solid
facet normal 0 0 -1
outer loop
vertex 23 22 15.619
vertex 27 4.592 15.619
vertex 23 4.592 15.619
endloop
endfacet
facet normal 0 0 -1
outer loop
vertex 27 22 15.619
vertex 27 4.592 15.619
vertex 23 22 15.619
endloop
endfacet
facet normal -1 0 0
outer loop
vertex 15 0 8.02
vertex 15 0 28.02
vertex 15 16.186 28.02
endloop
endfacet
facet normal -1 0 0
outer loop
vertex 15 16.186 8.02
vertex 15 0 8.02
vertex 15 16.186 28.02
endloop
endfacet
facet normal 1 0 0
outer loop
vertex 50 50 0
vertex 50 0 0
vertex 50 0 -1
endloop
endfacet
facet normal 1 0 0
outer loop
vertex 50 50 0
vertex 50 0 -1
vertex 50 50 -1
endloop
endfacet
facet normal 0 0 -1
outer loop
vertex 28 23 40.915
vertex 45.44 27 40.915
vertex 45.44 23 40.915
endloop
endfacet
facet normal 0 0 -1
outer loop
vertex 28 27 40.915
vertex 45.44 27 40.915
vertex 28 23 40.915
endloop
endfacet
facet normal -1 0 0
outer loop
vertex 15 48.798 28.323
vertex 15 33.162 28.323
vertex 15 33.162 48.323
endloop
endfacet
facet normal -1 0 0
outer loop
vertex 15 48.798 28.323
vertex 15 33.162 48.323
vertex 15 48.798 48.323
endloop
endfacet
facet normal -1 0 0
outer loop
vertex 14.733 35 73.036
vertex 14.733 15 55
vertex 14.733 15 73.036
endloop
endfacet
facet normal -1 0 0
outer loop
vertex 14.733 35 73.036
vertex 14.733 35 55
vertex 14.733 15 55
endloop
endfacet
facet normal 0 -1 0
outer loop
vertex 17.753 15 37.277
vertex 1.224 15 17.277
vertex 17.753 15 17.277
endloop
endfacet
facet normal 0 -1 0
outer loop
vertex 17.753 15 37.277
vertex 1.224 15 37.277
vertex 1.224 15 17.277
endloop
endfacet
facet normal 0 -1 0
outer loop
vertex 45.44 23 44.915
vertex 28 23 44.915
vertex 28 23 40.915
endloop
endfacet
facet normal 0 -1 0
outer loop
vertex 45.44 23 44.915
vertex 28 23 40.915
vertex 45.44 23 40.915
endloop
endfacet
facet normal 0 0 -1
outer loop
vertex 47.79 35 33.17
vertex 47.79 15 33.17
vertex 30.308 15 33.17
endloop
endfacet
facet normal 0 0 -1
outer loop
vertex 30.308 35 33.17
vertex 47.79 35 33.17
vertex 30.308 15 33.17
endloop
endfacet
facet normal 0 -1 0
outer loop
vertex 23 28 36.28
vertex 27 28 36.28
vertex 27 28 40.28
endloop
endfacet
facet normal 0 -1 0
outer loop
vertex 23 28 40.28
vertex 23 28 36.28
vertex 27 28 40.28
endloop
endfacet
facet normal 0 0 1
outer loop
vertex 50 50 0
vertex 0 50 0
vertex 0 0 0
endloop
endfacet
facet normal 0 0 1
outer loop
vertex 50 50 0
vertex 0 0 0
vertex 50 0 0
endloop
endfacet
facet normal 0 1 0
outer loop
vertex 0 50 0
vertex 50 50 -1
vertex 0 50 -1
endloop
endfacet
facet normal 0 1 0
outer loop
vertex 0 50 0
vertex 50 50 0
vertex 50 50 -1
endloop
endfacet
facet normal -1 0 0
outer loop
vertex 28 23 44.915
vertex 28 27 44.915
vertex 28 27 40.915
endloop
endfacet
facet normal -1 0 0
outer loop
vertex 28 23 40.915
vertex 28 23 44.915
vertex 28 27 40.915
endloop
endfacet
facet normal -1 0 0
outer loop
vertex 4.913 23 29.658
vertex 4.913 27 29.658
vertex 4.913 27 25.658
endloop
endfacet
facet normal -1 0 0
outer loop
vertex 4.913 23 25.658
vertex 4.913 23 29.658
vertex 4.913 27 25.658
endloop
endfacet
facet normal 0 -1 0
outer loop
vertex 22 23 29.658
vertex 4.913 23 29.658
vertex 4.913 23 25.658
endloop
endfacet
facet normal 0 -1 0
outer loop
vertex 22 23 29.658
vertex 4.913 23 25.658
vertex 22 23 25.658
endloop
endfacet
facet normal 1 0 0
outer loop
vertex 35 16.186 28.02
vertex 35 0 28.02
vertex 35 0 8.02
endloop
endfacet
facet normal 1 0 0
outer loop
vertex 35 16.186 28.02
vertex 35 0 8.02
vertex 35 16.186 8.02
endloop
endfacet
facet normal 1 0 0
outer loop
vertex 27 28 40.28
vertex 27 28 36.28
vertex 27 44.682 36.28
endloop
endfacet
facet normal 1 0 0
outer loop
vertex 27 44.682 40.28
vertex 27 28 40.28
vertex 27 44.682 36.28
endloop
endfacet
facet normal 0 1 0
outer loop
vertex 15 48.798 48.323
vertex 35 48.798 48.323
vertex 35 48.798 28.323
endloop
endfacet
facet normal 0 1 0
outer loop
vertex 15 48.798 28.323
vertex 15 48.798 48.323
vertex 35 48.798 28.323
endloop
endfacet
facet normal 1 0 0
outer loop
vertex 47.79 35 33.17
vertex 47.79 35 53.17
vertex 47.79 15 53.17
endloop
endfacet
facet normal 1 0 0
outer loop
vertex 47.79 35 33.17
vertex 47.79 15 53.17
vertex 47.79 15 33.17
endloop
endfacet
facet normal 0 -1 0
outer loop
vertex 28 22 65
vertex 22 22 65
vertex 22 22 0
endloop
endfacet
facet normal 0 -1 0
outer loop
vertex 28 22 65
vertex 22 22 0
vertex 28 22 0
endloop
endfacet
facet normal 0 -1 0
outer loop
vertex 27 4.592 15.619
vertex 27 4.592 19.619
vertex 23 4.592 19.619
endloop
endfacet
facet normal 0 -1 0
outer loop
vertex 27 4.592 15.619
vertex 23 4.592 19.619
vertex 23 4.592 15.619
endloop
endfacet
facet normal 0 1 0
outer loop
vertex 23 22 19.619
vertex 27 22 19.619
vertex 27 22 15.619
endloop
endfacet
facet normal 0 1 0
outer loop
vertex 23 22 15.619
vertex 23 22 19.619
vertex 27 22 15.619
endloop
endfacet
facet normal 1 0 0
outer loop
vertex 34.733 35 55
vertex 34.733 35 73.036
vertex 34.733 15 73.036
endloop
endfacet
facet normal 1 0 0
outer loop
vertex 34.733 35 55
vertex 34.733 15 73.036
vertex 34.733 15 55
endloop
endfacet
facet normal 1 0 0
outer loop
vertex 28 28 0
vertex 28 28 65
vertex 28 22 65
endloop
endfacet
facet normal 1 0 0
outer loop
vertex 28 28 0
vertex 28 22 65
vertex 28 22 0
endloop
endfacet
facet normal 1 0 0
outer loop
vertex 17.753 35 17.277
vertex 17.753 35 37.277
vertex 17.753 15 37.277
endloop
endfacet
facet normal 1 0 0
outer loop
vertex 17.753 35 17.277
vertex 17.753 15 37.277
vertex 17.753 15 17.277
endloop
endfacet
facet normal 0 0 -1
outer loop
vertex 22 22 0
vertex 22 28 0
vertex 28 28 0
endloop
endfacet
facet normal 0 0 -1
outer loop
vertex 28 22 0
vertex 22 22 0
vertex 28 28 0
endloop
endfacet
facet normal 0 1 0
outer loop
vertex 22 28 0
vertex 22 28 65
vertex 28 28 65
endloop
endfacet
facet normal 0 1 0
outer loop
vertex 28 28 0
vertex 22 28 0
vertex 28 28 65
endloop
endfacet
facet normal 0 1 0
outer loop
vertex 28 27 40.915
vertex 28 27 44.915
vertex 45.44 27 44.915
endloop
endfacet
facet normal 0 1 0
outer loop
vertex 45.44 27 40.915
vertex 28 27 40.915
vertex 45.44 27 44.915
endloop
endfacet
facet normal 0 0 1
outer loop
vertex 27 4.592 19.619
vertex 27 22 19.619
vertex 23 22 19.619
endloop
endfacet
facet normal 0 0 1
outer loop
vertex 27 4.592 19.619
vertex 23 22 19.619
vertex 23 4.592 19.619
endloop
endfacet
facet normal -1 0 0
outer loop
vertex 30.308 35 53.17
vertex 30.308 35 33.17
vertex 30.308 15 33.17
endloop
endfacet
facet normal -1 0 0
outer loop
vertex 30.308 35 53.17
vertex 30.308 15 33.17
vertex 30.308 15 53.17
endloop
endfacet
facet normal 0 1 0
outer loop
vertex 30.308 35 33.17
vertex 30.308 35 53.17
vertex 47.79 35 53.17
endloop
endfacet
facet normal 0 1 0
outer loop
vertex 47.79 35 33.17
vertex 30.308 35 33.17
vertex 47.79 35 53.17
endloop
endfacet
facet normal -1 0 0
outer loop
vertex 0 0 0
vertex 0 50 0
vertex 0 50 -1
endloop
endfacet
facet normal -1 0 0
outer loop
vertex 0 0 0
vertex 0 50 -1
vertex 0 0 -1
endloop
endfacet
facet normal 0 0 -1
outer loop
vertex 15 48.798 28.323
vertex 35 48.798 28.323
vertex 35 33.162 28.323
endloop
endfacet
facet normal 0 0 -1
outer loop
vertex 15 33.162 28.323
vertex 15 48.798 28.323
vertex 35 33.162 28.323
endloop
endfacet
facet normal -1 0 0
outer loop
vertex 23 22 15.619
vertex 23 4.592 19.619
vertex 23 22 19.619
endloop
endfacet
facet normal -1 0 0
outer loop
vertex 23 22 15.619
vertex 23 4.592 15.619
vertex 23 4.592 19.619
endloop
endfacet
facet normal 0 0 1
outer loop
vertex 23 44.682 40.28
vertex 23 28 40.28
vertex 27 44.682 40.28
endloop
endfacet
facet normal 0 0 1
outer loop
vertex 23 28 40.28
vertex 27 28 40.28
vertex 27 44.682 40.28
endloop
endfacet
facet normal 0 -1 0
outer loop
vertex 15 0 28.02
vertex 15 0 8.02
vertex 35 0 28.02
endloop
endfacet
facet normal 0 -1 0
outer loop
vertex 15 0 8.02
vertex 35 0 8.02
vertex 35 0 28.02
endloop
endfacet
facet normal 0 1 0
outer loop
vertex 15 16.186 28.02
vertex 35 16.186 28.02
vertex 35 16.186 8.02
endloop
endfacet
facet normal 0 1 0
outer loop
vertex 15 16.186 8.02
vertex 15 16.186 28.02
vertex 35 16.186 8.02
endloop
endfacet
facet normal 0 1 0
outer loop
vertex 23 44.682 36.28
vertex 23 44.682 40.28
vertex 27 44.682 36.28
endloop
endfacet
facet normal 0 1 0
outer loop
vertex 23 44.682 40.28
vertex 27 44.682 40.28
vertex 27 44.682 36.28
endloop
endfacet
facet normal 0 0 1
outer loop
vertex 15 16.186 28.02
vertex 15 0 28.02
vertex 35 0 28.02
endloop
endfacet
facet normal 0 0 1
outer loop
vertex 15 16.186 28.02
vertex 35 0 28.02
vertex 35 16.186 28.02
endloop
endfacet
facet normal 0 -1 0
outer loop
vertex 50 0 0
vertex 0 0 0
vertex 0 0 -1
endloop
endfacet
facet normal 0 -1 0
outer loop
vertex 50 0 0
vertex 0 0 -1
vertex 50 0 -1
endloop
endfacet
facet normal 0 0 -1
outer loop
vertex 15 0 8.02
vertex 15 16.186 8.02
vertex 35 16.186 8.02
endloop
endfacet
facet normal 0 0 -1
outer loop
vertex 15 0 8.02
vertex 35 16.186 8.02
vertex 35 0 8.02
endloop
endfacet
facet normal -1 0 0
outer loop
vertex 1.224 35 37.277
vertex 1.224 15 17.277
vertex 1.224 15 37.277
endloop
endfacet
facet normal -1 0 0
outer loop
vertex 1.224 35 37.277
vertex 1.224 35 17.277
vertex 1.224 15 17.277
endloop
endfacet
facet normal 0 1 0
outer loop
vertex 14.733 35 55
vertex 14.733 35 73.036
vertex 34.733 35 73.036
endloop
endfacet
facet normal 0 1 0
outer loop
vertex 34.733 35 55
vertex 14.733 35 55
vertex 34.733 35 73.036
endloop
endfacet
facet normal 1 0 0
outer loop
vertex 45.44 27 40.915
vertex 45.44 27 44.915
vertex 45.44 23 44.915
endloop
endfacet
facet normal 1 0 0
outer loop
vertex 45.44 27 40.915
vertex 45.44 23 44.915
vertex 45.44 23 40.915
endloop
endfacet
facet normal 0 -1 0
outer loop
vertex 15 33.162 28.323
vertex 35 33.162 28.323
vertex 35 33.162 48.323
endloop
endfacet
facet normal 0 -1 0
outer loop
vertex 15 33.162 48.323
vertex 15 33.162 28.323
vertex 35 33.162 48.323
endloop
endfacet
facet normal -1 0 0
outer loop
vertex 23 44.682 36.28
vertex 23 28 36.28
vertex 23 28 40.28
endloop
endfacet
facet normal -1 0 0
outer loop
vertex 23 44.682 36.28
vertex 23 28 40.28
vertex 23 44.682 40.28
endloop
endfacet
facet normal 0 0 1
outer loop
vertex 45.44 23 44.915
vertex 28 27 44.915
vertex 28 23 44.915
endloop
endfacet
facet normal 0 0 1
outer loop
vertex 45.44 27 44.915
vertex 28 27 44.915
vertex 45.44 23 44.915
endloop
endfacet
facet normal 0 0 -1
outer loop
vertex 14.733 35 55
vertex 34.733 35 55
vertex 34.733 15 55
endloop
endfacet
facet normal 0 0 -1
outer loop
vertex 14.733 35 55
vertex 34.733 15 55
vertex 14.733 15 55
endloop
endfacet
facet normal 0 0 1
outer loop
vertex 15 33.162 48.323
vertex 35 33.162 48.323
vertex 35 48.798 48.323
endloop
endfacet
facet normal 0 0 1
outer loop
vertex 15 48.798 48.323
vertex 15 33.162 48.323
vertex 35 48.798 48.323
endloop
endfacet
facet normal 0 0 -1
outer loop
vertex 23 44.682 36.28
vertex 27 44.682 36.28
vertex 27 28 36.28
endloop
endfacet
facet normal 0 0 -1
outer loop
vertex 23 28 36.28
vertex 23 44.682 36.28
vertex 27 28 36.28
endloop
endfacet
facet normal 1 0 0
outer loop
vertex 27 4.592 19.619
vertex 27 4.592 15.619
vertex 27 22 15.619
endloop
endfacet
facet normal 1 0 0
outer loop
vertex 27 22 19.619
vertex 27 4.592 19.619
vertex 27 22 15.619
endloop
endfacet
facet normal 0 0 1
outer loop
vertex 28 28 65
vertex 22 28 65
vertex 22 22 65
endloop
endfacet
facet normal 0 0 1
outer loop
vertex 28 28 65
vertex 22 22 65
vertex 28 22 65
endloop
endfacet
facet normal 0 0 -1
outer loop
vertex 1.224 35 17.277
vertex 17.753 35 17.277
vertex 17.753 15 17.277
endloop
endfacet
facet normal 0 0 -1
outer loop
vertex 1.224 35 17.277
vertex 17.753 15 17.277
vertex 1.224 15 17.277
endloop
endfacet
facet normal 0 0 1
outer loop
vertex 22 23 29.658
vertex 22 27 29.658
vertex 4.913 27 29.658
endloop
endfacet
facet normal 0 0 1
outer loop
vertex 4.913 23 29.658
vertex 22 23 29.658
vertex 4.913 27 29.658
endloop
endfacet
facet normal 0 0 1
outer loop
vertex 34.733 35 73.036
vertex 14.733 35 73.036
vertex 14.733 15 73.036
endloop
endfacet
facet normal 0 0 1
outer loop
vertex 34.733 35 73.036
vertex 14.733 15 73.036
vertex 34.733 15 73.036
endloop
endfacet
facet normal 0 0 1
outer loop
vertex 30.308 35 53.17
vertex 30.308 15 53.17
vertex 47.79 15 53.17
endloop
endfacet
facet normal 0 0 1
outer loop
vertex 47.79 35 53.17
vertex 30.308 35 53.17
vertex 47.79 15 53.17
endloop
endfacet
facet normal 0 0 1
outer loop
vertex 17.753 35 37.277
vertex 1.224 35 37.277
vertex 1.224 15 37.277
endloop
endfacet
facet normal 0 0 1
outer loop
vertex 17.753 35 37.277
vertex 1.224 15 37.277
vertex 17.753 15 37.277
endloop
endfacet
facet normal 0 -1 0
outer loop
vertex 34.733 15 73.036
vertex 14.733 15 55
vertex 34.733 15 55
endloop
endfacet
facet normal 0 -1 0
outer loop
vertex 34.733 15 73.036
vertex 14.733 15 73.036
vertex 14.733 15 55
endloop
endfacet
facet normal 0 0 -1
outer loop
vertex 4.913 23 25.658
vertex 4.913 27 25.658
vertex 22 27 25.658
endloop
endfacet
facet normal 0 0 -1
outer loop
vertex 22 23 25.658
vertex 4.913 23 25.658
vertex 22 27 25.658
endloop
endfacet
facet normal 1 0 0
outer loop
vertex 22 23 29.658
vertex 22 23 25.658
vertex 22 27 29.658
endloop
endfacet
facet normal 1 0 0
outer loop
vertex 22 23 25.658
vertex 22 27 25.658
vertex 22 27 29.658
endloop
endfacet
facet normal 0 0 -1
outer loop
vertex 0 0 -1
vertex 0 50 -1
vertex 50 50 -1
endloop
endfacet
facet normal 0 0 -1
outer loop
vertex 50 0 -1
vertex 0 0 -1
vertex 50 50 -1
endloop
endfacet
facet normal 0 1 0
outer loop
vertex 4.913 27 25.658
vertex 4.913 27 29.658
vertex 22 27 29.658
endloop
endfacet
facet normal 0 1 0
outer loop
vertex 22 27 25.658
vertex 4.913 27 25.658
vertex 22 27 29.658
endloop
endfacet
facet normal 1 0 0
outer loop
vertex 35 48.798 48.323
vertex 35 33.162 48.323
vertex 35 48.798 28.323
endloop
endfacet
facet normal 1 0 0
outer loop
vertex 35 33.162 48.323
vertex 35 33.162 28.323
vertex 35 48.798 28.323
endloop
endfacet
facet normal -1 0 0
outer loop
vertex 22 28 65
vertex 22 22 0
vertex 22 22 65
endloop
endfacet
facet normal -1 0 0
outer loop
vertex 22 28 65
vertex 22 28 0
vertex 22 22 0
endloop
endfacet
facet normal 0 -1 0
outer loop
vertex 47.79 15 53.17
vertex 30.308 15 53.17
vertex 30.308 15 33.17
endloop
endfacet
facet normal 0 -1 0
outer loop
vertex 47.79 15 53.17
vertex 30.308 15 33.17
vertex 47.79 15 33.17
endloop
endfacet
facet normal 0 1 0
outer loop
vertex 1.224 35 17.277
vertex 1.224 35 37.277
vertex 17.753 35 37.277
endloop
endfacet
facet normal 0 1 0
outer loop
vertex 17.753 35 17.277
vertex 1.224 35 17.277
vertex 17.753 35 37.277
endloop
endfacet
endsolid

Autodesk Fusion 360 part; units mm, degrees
sketch "Skizze1" plane through (0, 0, 0) normal (0, 0, 1) x (1, 0, 0)
  line L0 (0, 0) -> (50, 0)
  line L1 (50, 0) -> (50, 50)
  line L2 (50, 50) -> (0, 50)
  line L3 (0, 50) -> (0, 0)
  line L4 (0, 25) -> (50, 25) construction
  line L5 (25, 50) -> (25, 0) construction
extrude "Extrusion1" add sketch "Skizze1" against normal blind 1 makes body 1 in component "Ground"
ref_plane "Arbeitsebene1" through (25, 25, 0) normal (0, -1, 0) x (1, 0, 0)
ref_plane "Arbeitsebene2" through (25, 25, 0) normal (-1, 0, 0) x (0, -1, 0)
sketch "Skizze2" plane through (25, 25, 0) normal (0, -1, 0) x (1, 0, 0)
  line L0 (-25, 0) -> (25, 0)
  line L1 (0, 0) -> (0, 75) construction
  line L2 (-3, 0) -> (-3, 65)
  line L3 (-3, 65) -> (3, 65)
  line L4 (3, 65) -> (3, 0)
  line L5 (-3, 0) -> (3, 0)
  line L6 (-3, 29.6581) -> (-20.0867, 29.6581)
  line L7 (-20.0867, 29.6581) -> (-20.0867, 25.6581)
  line L8 (-20.0867, 25.6581) -> (-3, 25.6581)
  line L9 (-3, 25.6581) -> (-3, 29.6581)
  line L10 (3, 44.9151) -> (20.4397, 44.9151)
  line L11 (20.4397, 44.9151) -> (20.4397, 40.9151)
  line L12 (20.4397, 40.9151) -> (3, 40.9151)
  line L13 (3, 40.9151) -> (3, 44.9151)
  line L14 (-23.7757, 37.2774) -> (-7.2473, 37.2774)
  line L15 (-7.2473, 37.2774) -> (-7.2473, 17.2774)
  line L16 (-7.2473, 17.2774) -> (-23.7757, 17.2774)
  line L17 (-23.7757, 17.2774) -> (-23.7757, 37.2774)
  line L18 (5.3079, 53.1701) -> (22.7898, 53.1701)
  line L19 (22.7898, 53.1701) -> (22.7898, 33.1701)
  line L20 (22.7898, 33.1701) -> (5.3079, 33.1701)
  line L21 (5.3079, 33.1701) -> (5.3079, 53.1701)
  line L22 (-10.267, 73.036) -> (9.733, 73.036)
  line L23 (9.733, 73.036) -> (9.733, 55)
  line L24 (9.733, 55) -> (-10.267, 55)
  line L25 (-10.267, 55) -> (-10.267, 73.036)
  dimension "d21" = 6
  dimension "d25" = 3
  dimension "d26" = 4
  dimension "d27" = 4
  dimension "d36" = 20
  dimension "d37" = 20
  dimension "d38" = 20
extrude "Extrusion1'" add sketch "Skizze2" along normal mid plane 6 separate body contours L0 L2 L4 L5 L9 L13 L24 | L2 L3 L4 L24 makes body 2 in component "Trunk"
sketch "Skizze3" plane through (25, 25, 0) normal (-1, 0, 0) x (0, 1, 0)
  line L0 (3, -65) -> (-3, -65)
  line L1 (-3, -65) -> (-3, 0)
  line L2 (-3, 0) -> (3, 0)
  line L3 (3, 0) -> (3, -65)
  line L4 (0, -44.9151) -> (0, -40.9151)
  line L5 (0, -29.6581) -> (0, -25.6581)
  line L6 (3, -40.2798) -> (19.6821, -40.2798)
  line L7 (19.6821, -40.2798) -> (19.6821, -36.2798)
  line L8 (19.6821, -36.2798) -> (3, -36.2798)
  line L9 (3, -36.2798) -> (3, -40.2798)
  line L10 (-3, -19.6193) -> (-20.4076, -19.6193)
  line L11 (-20.4076, -19.6193) -> (-20.4076, -15.6193)
  line L12 (-20.4076, -15.6193) -> (-3, -15.6193)
  line L13 (-3, -15.6193) -> (-3, -19.6193)
  line L14 (8.1625, -48.3226) -> (23.7982, -48.3226)
  line L15 (23.7982, -48.3226) -> (23.7982, -28.3226)
  line L16 (23.7982, -28.3226) -> (8.1625, -28.3226)
  line L17 (8.1625, -28.3226) -> (8.1625, -48.3226)
  line L18 (-25, -28.0196) -> (-8.8142, -28.0196)
  line L19 (-8.8142, -28.0196) -> (-8.8142, -8.0196)
  line L20 (-8.8142, -8.0196) -> (-25, -8.0196)
  line L21 (-25, -8.0196) -> (-25, -28.0196)
  line L22 (-20.4076, -17.6193) -> (-3, -17.6193) construction
  line L23 (3, -38.2798) -> (19.6821, -38.2798) construction
  dimension "d32" = 4
  dimension "d33" = 4
  dimension "d34" = 20
  dimension "d35" = 20
extrude "Extrusion1''" add sketch "Skizze3" along normal mid plane 4 separate body contours L3 L6 L8 L9 L17 | L1 L10 L12 L13 L19 | L6 L7 L8 L17 | L10 L11 L12 L19 makes body 3 at (24.3333, 10.395, 19.6193) makes body 4 at (23, 39.1214, 38.9465) in component "Branches Y"
extrude "Extrusion1'''" add sketch "Skizze2" along normal mid plane 4 separate body contours L2 L6 L8 L9 L15 | L4 L10 L12 L13 L21 | L6 L7 L8 L15 | L10 L11 L12 L21 makes body 5 at (10.6089, 24.3333, 25.6581) makes body 6 at (33.8132, 23, 42.2484) in component "Branches X"
extrude "Extrusion1''''" add sketch "Skizze2" along normal mid plane 20 separate body contours L6 L7 L8 L14 L15 L16 L17 | L6 L7 L8 L15 | L10 L11 L12 L21 | L10 L11 L12 L18 L19 L20 L21 | L2 L3 L4 L22 L23 L24 L25 | L2 L3 L4 L24 makes body 7 at (1.2243, 28.3333, 23.9441) makes body 8 at (30.3079, 28.3333, 39.8368) makes body 9 at (21.3997, 21.6667, 73.036) in component "Leaf X"
extrude "Extrusion1'''''" add sketch "Skizze3" along normal mid plane 20 separate body contours L6 L7 L8 L17 | L6 L7 L8 L14 L15 L16 L17 | L10 L11 L12 L18 L19 L20 L21 | L10 L11 L12 L19 makes body 10 at (28.3333, 16.1858, 21.3529) makes body 11 at (21.6667, 33.1625, 41.656) in component "Leaf Y"
component "Ground" placed x (1, 0, 0) y (0, 1, 0) z (0, 0, 1) at (0, 0, 0)
component "Trunk" placed x (1, 0, 0) y (0, 1, 0) z (0, 0, 1) at (0, 0, 0)
component "Branches Y" placed x (1, 0, 0) y (0, 1, 0) z (0, 0, 1) at (0, 0, 0)
component "Branches X" placed x (1, 0, 0) y (0, 1, 0) z (0, 0, 1) at (0, 0, 0)
component "Leaf X" placed x (1, 0, 0) y (0, 1, 0) z (0, 0, 1) at (0, 0, 0)
component "Leaf Y" placed x (1, 0, 0) y (0, 1, 0) z (0, 0, 1) at (0, 0, 0)
equation "d21 = d_trunk"
equation "d_trunk = 6 mm" comment "Diameter Treetrunk"
equation "d_branch = 4 mm" comment "Diameter tree branch"
equation "d_leaf = 20 mm" comment "diameter leafball"
equation "d25 = d21 / 2"
equation "d26 = d_branch"
equation "d27 = d_branch"
equation "d30 = d_trunk / 2"
equation "d32 = d_branch"
equation "d33 = d_branch"
equation "d34 = d_leaf"
equation "d35 = d_leaf"
equation "d36 = d_leaf"
equation "d37 = d_leaf"
equation "d38 = d_leaf"
equation "d39 = d_branch / 2"
equation "d41 = d_branch / 2"
equation "d43 = d_leaf / 2"
equation "d45 = d_leaf / 2"
